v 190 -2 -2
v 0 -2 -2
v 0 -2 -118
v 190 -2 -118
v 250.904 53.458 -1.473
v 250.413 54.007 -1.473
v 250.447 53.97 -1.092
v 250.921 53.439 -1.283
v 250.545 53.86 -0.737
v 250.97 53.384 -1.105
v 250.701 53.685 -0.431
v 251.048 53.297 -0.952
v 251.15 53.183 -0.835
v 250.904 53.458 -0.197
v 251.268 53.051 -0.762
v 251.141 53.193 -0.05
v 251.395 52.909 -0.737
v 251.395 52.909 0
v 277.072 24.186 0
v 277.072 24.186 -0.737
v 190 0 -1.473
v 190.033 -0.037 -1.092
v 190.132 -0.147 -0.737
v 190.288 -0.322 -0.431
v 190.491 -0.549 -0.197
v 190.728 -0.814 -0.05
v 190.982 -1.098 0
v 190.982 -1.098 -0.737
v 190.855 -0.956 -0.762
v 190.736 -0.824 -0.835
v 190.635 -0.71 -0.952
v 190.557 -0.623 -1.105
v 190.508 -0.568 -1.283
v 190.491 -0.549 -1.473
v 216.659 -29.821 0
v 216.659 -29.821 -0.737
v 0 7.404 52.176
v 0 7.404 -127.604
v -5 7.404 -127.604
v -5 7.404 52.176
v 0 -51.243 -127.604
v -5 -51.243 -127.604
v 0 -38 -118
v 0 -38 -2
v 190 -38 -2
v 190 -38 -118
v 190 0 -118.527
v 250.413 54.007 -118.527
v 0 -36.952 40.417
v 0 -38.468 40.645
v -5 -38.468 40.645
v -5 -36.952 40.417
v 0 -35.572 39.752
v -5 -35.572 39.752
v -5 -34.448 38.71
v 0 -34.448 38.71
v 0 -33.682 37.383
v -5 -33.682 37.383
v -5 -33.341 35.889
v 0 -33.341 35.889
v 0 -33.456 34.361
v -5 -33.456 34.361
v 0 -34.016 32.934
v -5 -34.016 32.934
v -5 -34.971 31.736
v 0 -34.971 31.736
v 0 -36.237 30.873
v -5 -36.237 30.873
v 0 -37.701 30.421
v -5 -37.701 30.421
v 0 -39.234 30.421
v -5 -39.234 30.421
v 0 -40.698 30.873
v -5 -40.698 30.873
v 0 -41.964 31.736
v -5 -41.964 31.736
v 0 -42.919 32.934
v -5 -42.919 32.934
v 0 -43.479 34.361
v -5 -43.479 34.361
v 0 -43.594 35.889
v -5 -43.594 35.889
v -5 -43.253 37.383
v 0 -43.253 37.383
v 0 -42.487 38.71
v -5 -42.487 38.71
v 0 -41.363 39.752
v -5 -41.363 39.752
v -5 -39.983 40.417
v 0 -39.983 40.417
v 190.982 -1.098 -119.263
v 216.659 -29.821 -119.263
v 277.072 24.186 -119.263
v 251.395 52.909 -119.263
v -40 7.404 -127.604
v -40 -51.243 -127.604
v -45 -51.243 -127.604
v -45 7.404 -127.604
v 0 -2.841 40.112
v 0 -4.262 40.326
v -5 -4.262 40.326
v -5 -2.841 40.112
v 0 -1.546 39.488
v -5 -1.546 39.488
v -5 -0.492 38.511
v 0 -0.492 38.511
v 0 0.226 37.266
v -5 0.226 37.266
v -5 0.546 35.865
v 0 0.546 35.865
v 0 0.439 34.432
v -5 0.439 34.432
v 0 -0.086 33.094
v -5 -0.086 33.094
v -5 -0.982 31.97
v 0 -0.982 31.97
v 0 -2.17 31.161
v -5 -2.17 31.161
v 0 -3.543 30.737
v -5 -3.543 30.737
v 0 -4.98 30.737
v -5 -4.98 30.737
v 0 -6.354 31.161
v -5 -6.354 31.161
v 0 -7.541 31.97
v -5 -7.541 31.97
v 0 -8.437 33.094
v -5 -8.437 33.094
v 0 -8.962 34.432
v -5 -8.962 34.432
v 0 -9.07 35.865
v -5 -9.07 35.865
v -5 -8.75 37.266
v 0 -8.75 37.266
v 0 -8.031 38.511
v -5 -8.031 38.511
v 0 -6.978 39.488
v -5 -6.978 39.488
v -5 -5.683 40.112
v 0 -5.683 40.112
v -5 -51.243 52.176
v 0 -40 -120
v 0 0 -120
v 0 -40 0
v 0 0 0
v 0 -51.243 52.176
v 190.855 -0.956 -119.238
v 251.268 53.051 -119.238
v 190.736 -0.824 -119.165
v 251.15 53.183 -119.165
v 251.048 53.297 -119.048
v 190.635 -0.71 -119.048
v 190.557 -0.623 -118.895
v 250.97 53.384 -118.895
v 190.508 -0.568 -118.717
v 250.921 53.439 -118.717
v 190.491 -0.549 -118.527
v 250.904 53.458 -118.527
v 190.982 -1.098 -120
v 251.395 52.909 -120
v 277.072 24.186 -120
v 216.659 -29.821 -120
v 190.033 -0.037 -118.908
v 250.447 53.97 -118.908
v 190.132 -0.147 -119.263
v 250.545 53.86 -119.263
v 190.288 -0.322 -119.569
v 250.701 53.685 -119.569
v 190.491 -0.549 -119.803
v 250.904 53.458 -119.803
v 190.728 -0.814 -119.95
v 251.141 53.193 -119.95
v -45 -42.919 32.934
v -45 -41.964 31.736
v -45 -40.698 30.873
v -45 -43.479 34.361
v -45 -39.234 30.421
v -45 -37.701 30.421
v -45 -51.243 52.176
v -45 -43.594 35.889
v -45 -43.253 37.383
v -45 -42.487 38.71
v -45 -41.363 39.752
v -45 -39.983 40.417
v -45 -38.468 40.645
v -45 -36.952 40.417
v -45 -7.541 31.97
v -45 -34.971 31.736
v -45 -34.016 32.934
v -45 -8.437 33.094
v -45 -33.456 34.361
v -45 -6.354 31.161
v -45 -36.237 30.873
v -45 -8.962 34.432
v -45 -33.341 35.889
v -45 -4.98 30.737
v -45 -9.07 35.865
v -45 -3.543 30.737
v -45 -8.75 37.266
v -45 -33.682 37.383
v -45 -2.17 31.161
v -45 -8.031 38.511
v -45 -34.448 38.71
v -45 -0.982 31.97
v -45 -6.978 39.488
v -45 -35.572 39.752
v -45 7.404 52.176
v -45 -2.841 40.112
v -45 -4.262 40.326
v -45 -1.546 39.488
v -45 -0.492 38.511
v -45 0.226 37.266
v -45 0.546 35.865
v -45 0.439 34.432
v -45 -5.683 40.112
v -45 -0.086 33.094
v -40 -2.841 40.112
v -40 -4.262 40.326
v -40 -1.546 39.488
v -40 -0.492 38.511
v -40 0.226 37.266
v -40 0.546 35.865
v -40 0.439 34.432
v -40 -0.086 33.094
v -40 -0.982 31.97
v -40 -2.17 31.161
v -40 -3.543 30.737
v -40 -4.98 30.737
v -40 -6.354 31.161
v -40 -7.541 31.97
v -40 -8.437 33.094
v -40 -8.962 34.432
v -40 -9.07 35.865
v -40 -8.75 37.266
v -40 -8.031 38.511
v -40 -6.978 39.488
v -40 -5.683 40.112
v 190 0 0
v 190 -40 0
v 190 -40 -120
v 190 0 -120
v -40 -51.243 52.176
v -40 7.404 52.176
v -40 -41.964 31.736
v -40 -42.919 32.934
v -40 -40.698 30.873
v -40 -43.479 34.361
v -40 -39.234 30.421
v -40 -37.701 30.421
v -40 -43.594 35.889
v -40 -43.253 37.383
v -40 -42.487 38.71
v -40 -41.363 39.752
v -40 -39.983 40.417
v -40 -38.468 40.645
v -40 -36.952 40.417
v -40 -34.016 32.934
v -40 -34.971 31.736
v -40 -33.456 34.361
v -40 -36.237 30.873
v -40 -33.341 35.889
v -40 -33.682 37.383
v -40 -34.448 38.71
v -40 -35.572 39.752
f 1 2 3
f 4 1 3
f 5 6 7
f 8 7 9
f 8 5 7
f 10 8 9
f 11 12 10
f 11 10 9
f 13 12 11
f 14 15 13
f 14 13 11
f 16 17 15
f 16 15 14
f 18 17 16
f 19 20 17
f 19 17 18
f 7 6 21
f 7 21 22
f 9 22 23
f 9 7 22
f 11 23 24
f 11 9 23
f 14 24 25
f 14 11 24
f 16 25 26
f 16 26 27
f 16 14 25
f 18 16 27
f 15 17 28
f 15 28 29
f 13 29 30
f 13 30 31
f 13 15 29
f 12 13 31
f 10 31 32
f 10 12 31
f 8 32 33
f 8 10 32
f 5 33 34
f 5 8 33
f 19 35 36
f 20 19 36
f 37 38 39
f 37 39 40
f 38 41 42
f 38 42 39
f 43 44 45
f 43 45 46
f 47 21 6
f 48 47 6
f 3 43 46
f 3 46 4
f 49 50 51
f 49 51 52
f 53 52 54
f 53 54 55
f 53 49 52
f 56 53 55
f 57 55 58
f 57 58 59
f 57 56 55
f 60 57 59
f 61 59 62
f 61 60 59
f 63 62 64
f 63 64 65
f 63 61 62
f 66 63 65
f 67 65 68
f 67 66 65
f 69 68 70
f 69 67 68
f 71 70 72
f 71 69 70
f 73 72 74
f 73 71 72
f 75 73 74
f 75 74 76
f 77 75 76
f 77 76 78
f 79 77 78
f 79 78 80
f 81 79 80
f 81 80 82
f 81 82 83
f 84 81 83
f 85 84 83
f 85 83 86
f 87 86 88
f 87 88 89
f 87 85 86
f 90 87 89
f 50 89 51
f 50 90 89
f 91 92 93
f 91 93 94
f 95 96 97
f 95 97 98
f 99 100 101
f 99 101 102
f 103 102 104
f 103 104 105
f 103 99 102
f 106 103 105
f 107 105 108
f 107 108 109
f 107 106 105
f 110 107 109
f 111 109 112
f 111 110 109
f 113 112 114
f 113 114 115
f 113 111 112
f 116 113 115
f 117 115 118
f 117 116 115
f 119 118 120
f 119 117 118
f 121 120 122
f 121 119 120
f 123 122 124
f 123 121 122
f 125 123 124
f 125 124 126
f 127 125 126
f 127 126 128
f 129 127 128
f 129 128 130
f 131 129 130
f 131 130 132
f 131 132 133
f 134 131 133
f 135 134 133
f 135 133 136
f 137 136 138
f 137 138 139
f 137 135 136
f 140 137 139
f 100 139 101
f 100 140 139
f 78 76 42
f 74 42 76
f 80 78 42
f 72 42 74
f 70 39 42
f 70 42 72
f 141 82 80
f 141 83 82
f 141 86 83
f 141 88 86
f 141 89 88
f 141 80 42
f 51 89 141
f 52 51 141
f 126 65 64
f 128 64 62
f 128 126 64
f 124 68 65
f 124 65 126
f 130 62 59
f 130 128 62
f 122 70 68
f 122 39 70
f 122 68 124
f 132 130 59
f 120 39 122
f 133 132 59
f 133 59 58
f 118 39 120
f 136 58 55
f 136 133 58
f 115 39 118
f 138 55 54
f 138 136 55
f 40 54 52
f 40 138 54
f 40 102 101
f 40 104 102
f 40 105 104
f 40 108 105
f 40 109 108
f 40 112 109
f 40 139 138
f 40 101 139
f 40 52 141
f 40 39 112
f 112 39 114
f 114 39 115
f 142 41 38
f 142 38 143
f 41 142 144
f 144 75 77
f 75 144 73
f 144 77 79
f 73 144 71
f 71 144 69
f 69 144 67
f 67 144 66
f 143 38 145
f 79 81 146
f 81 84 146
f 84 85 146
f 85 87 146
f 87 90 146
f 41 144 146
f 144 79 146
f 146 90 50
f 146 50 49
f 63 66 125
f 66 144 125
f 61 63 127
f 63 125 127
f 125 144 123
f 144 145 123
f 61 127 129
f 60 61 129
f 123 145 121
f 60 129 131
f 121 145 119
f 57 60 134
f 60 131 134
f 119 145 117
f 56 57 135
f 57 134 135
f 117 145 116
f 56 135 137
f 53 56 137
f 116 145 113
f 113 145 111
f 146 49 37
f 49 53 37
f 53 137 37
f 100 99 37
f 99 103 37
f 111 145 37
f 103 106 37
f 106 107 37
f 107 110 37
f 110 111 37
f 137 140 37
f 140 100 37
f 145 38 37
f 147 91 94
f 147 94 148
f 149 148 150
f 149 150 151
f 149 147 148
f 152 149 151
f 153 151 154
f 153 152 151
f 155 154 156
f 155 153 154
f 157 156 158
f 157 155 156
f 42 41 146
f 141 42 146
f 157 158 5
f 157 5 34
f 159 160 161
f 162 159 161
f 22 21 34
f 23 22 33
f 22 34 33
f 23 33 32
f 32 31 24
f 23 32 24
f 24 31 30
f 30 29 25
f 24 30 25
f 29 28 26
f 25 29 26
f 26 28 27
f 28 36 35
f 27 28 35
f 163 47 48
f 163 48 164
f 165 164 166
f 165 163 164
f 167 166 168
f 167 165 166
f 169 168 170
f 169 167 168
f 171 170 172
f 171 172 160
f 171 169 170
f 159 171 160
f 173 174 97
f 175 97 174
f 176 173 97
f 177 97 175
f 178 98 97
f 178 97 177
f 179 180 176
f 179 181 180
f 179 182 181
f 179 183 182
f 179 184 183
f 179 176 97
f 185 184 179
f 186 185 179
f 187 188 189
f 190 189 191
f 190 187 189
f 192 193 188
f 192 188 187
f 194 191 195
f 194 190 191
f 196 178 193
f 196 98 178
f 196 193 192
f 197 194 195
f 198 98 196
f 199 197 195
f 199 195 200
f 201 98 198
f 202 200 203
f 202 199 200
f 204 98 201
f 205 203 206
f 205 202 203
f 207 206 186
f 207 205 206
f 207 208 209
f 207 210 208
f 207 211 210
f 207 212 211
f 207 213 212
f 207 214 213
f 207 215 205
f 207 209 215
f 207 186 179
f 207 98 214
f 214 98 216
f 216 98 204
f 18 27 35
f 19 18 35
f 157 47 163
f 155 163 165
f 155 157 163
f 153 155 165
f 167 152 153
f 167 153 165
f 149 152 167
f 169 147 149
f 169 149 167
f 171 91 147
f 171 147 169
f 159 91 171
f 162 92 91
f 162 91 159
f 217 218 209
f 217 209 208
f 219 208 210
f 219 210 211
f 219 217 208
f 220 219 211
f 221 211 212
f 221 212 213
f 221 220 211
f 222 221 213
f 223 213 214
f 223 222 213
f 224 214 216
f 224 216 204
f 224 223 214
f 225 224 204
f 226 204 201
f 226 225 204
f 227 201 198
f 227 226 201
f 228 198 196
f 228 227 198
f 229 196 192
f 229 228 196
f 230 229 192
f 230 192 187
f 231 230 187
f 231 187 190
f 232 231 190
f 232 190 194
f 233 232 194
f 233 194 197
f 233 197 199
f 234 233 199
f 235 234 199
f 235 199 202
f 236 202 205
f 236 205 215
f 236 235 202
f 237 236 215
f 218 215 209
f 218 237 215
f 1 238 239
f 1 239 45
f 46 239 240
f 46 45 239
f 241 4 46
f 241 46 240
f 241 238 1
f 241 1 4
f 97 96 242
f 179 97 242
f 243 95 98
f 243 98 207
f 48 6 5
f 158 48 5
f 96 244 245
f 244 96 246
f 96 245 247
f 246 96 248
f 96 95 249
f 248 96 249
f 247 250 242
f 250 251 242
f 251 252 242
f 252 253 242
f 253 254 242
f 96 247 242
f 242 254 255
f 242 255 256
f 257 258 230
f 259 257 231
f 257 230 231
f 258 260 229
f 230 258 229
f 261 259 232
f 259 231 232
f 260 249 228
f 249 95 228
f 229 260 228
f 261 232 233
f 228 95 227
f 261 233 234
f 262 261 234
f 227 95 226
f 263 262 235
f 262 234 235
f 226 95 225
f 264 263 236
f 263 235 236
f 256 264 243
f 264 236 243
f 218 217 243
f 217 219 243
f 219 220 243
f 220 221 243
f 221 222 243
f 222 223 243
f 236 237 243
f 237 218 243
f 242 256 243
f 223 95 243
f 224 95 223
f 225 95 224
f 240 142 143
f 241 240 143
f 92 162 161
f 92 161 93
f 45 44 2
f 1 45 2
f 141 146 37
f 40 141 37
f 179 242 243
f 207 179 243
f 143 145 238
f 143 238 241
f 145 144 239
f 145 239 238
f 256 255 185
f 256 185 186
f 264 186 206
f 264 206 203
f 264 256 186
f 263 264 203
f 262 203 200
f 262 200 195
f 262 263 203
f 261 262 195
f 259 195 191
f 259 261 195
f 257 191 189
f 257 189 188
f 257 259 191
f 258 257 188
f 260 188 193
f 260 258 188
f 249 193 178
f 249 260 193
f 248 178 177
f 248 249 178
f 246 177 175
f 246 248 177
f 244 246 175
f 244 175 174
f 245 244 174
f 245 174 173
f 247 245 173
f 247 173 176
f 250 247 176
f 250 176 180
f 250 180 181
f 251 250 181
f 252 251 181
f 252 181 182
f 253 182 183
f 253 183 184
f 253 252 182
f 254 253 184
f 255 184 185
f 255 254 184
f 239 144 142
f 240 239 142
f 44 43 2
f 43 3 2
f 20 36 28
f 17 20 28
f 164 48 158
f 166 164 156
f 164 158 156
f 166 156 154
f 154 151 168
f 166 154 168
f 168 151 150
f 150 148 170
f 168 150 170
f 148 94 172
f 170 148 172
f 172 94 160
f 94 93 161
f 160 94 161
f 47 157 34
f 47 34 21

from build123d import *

# Parameters (mm, degrees)
SKETCH1_W                    = 120
SKETCH1_H                    = 40
SKETCH1_W_2                  = 116
SKETCH1_H_2                  = 36
BOSS_EXTRUDE1_DEPTH          = 190
SKETCH2_W                    = 179.779443165
SKETCH2_H                    = 58.646912064
SKETCH2_R                    = 4.82149765
SKETCH2_R_2                  = 5.140640696
BOSS_EXTRUDE2_DEPTH          = 5
BOSS_EXTRUDE3_START          = 40
SKETCH2_2_W                  = 179.779443165
SKETCH2_2_H                  = 58.646912064
SKETCH2_2_R                  = 4.82149765
SKETCH2_2_R_2                = 5.140640696
BOSS_EXTRUDE3_DEPTH          = 5
BASE_FLANGE1_DEPTH           = 120
EDGE_FLANGE1_STRIP_W         = 4.4196
EDGE_FLANGE1_STRIP_H         = 0.7366
EDGE_FLANGE1_STRIP_CUT_DEPTH = 81.034210559
EDGE_FLANGE1_DEPTH           = 81.034210559
EDGE_FLANGE2_STRIP_W         = 4.4196
EDGE_FLANGE2_STRIP_H         = 0.7366
EDGE_FLANGE2_STRIP_CUT_DEPTH = 81.034210559
EDGE_FLANGE2_DEPTH           = 81.034210559


# Sheet-metal steps are written as plain solids
with BuildPart() as part:
    # Sketch1 → Boss-Extrude1 (new body)
    with BuildSketch(Plane(origin=(0, 0, 0), x_dir=(0, 0, -1), z_dir=(1, 0, 0))):
        with Locations((60, -20)):
            Rectangle(SKETCH1_W, SKETCH1_H)
        with Locations((60, -20)):
            Rectangle(SKETCH1_W_2, SKETCH1_H_2, mode=Mode.SUBTRACT)
    extrude(amount=BOSS_EXTRUDE1_DEPTH)

    # Sketch2 → Boss-Extrude2 (add)
    with BuildSketch(Plane.ZY):
        with Locations((-37.714173415, -21.919353486)):
            Rectangle(SKETCH2_W, SKETCH2_H)
        with Locations((35.504640434, -4.261786117)):
            Circle(SKETCH2_R, mode=Mode.SUBTRACT)
        with Locations((35.504640434, -38.467545112)):
            Circle(SKETCH2_R_2, mode=Mode.SUBTRACT)
    extrude(amount=BOSS_EXTRUDE2_DEPTH)


with BuildPart() as body_2:
    # Sketch2<2> → Boss-Extrude3 (new body)
    with BuildSketch(Plane.ZY.offset(BOSS_EXTRUDE3_START)):
        with Locations((-37.714173415, -21.919353486)):
            Rectangle(SKETCH2_2_W, SKETCH2_2_H)
        with Locations((35.504640434, -4.261786117)):
            Circle(SKETCH2_2_R, mode=Mode.SUBTRACT)
        with Locations((35.504640434, -38.467545112)):
            Circle(SKETCH2_2_R_2, mode=Mode.SUBTRACT)
    extrude(amount=BOSS_EXTRUDE3_DEPTH)


with BuildPart() as body_3:
    # Sketch4 → Base-Flange1 (new body)
    with BuildSketch(Plane.XY):
        Polygon((190, 0), (250.413405054, 54.007071488), (250.904328684, 53.457914362), (190.490923631, -0.549157126), align=None)
    extrude(amount=-BASE_FLANGE1_DEPTH)

    # Edge-Flange1 strip (across the edge) → Edge-Flange1 strip cut (cut)
    with BuildSketch(Plane(origin=(250.904328684, 53.457914362, 0), x_dir=(0, 0, -1), z_dir=(-0.745529630475018, -0.6664724826155866, 0))):
        with Locations((-0.7366, -0.3683)):
            Rectangle(EDGE_FLANGE1_STRIP_W, EDGE_FLANGE1_STRIP_H)
    extrude(amount=EDGE_FLANGE1_STRIP_CUT_DEPTH, mode=Mode.SUBTRACT)

    # Edge-Flange1 section (across the edge) → Edge-Flange1 (add)
    with BuildSketch(Plane(origin=(250.904328684, 53.457914362, 0), x_dir=(0, 0, -1), z_dir=(-0.745529630475018, -0.6664724826155866, 0))):
        with BuildLine():
            Line((0, 0.7366), (0, 39.2634))
            Line((0, 39.2634), (0.7366, 39.2634))
            Line((0.7366, 39.2634), (0.7366, 0.7366))
            ThreePointArc((0.7366, 0.7366), (0.952345145, 0.215745145), (1.4732, 0))
            Line((1.4732, 0), (1.4732, -0.7366))
            ThreePointArc((1.4732, -0.7366), (0.43149029, -0.30510971), (0, 0.7366))
        make_face()
    extrude(amount=EDGE_FLANGE1_DEPTH)

    # Edge-Flange2 strip (across the edge) → Edge-Flange2 strip cut (cut)
    with BuildSketch(Plane(origin=(190.490923631, -0.549157126, -120), x_dir=(0, 0, 1), z_dir=(0.745529630475018, 0.6664724826155866, 0))):
        with Locations((-0.7366, -0.3683)):
            Rectangle(EDGE_FLANGE2_STRIP_W, EDGE_FLANGE2_STRIP_H)
    extrude(amount=EDGE_FLANGE2_STRIP_CUT_DEPTH, mode=Mode.SUBTRACT)

    # Edge-Flange2 section (across the edge) → Edge-Flange2 (add)
    with BuildSketch(Plane(origin=(190.490923631, -0.549157126, -120), x_dir=(0, 0, 1), z_dir=(0.745529630475018, 0.6664724826155866, 0))):
        with BuildLine():
            Line((0, 0.7366), (0, 39.2634))
            Line((0, 39.2634), (0.7366, 39.2634))
            Line((0.7366, 39.2634), (0.7366, 0.7366))
            ThreePointArc((0.7366, 0.7366), (0.952345145, 0.215745145), (1.4732, 0))
            Line((1.4732, 0), (1.4732, -0.7366))
            ThreePointArc((1.4732, -0.7366), (0.43149029, -0.30510971), (0, 0.7366))
        make_face()
    extrude(amount=EDGE_FLANGE2_DEPTH)


solid = Compound([part.part, body_2.part, body_3.part])
